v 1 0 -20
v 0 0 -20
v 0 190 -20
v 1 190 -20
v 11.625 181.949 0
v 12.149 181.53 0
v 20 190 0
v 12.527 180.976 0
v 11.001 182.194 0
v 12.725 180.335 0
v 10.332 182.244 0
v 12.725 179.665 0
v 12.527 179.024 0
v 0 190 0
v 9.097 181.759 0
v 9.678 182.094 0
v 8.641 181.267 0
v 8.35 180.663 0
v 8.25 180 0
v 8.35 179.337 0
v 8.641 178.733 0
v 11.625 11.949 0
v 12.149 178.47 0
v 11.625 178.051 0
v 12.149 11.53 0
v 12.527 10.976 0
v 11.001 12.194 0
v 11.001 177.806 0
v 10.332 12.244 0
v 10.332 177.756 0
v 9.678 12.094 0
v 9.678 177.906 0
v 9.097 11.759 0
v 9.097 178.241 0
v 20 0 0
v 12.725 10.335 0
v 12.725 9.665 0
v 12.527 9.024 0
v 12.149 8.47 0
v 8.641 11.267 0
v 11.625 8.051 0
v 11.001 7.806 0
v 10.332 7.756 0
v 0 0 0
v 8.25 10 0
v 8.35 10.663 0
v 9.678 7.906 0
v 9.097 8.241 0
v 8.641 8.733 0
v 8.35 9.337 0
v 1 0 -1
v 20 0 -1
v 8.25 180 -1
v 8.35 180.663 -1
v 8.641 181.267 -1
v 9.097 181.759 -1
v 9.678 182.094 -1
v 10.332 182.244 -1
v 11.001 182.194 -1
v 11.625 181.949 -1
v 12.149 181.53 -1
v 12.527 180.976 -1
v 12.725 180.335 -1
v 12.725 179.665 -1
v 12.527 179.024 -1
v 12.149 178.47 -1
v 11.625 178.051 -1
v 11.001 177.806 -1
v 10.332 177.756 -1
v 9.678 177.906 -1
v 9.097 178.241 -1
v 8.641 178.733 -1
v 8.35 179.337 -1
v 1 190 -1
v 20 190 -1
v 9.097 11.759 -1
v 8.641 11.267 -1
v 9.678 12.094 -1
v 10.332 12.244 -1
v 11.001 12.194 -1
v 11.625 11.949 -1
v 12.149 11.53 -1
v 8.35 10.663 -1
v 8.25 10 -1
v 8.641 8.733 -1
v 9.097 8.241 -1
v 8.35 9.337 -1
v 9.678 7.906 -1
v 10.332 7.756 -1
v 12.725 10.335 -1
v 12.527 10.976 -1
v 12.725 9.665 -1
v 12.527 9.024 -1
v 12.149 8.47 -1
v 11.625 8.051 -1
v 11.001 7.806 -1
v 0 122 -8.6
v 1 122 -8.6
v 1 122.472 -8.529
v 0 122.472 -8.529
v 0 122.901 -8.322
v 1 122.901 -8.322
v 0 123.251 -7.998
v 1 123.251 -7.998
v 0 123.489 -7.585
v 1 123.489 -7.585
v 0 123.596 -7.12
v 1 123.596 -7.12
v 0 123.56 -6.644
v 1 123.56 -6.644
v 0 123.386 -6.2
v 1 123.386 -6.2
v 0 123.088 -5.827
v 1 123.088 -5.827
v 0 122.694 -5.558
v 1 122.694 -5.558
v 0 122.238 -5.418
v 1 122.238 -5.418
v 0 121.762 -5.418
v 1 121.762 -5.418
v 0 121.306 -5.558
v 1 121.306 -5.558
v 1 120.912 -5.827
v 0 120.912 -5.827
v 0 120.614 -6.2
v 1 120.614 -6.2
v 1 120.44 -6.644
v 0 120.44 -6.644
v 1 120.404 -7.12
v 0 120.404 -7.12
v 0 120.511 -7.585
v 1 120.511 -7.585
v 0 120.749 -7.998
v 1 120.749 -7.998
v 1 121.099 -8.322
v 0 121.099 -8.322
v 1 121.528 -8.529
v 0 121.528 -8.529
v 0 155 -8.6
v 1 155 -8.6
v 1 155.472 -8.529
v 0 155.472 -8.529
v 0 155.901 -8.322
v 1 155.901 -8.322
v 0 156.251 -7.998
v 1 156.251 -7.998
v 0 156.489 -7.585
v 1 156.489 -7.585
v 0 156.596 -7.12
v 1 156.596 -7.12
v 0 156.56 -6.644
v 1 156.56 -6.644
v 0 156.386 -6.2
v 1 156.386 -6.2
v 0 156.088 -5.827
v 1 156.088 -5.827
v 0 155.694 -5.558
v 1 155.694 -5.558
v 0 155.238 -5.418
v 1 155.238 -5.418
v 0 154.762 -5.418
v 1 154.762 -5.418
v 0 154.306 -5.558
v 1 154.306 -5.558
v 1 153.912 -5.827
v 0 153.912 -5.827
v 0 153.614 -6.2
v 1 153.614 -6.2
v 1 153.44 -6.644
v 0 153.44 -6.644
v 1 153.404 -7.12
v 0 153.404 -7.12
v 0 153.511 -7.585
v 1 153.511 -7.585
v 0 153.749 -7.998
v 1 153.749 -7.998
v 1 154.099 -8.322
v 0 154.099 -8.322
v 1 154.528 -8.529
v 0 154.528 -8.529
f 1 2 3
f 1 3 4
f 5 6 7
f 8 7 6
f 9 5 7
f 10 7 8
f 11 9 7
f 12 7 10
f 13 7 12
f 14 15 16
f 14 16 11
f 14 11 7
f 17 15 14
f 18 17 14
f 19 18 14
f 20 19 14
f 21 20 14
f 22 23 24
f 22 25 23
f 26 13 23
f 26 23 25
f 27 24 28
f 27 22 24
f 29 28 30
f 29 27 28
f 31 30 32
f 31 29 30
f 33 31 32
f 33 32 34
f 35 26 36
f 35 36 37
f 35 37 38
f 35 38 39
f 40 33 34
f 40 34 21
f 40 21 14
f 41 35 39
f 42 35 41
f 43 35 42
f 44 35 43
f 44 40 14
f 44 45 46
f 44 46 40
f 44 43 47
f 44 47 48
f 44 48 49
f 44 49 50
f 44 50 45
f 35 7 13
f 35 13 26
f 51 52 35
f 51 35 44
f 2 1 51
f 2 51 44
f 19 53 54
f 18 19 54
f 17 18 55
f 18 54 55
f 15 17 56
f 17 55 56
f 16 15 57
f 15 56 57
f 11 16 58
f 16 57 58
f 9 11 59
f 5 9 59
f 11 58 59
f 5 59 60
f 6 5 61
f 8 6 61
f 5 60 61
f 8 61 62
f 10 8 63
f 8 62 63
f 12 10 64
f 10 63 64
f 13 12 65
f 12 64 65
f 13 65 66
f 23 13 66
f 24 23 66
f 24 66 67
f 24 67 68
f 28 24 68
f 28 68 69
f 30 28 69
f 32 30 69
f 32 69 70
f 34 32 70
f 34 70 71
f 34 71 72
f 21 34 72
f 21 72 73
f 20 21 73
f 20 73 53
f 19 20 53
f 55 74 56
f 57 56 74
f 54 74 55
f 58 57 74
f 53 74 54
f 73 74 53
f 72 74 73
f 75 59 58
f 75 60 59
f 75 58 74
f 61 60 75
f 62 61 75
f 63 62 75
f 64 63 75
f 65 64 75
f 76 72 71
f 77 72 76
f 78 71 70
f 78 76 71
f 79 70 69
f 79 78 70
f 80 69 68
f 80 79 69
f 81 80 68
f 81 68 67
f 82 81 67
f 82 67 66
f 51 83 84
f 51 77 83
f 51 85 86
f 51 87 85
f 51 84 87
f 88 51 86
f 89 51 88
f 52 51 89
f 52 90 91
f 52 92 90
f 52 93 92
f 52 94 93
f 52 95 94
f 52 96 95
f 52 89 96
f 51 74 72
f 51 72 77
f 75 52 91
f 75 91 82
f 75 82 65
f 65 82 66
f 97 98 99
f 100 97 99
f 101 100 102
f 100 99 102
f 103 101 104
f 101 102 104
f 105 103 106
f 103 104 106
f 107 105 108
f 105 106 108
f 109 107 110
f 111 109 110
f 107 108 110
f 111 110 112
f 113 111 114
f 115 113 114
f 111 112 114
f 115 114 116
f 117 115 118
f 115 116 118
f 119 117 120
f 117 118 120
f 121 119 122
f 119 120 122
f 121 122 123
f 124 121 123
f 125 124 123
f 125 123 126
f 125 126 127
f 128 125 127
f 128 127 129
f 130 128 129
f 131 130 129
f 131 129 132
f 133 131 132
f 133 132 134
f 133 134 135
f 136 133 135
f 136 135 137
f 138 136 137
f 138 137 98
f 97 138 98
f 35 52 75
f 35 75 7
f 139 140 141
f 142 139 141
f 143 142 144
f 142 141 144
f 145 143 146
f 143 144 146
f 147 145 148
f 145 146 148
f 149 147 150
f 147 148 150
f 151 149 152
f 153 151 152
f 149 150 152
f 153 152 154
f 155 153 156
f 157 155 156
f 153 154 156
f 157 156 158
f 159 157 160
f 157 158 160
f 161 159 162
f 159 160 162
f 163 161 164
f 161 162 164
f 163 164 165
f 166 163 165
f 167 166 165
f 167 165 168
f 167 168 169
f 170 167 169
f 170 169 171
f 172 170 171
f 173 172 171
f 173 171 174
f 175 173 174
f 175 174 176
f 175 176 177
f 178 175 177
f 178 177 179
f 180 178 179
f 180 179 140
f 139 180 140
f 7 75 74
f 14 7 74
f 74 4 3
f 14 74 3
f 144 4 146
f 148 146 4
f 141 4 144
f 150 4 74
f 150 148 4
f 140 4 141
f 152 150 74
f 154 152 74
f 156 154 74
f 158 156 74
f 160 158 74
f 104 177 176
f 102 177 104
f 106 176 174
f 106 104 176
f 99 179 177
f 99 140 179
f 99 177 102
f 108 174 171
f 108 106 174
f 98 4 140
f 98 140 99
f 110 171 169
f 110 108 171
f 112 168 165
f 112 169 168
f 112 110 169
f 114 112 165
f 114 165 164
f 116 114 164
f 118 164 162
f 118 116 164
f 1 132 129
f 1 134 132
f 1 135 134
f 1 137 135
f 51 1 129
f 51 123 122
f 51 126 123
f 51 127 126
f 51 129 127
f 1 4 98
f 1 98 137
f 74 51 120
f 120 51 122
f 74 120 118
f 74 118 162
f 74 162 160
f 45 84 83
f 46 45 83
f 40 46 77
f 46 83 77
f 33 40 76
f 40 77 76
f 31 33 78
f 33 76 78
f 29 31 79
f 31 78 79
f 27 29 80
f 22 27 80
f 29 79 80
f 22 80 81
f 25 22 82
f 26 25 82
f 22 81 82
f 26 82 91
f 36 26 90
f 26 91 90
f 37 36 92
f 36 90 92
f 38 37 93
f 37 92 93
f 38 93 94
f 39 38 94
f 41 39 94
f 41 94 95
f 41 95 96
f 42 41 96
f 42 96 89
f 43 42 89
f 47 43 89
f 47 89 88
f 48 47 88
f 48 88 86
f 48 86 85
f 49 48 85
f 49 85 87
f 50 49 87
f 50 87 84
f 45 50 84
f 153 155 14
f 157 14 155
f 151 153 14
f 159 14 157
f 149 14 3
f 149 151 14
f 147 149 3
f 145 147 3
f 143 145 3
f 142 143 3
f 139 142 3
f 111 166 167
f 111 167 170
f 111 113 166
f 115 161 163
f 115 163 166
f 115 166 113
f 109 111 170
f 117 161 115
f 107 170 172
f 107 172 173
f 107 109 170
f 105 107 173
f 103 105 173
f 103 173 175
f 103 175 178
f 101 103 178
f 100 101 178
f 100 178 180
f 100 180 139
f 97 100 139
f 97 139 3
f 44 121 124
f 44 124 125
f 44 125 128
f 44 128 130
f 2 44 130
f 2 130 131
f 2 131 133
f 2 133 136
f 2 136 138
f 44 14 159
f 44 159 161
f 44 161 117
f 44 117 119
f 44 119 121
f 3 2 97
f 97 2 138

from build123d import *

# Parameters (mm, degrees)
EXTRUDE_1_DEPTH     = 190
SKETCH_2_R          = 2.25
CUT_EXTRUDE_1_DEPTH = 2
SKETCH1_R           = 1.6
CUT_EXTRUDE1_DEPTH  = 2


with BuildPart() as part:
    # Эскиз1 → Бобышка-Вытянуть1 (new body)
    with BuildSketch(Plane(origin=(0, 0, 0), x_dir=(1, 0, 0), z_dir=(0, 1, 0))):
        Polygon((0, 0), (0, 20), (1, 20), (1, 1), (20, 1), (20, 0), align=None)
    extrude(amount=EXTRUDE_1_DEPTH)

    # Эскиз2 → Вырез-Вытянуть1 (cut, through all)
    with BuildSketch(Plane(origin=(0, 0, -1), x_dir=(-1, 0, 0), z_dir=(0, 0, -1))):
        with Locations((-10.5, 10)):
            Circle(SKETCH_2_R)
        with Locations((-10.5, 180)):
            Circle(SKETCH_2_R)
    extrude(amount=-CUT_EXTRUDE_1_DEPTH, mode=Mode.SUBTRACT)

    # Sketch1 → Cut-Extrude1 (cut, through all)
    with BuildSketch(Plane(origin=(1, 0, 0), x_dir=(0, 0, -1), z_dir=(1, 0, 0))):
        with Locations((7, 155)):
            Circle(SKETCH1_R)
        with Locations((7, 122)):
            Circle(SKETCH1_R)
    extrude(amount=-CUT_EXTRUDE1_DEPTH, mode=Mode.SUBTRACT)


solid = part.part
